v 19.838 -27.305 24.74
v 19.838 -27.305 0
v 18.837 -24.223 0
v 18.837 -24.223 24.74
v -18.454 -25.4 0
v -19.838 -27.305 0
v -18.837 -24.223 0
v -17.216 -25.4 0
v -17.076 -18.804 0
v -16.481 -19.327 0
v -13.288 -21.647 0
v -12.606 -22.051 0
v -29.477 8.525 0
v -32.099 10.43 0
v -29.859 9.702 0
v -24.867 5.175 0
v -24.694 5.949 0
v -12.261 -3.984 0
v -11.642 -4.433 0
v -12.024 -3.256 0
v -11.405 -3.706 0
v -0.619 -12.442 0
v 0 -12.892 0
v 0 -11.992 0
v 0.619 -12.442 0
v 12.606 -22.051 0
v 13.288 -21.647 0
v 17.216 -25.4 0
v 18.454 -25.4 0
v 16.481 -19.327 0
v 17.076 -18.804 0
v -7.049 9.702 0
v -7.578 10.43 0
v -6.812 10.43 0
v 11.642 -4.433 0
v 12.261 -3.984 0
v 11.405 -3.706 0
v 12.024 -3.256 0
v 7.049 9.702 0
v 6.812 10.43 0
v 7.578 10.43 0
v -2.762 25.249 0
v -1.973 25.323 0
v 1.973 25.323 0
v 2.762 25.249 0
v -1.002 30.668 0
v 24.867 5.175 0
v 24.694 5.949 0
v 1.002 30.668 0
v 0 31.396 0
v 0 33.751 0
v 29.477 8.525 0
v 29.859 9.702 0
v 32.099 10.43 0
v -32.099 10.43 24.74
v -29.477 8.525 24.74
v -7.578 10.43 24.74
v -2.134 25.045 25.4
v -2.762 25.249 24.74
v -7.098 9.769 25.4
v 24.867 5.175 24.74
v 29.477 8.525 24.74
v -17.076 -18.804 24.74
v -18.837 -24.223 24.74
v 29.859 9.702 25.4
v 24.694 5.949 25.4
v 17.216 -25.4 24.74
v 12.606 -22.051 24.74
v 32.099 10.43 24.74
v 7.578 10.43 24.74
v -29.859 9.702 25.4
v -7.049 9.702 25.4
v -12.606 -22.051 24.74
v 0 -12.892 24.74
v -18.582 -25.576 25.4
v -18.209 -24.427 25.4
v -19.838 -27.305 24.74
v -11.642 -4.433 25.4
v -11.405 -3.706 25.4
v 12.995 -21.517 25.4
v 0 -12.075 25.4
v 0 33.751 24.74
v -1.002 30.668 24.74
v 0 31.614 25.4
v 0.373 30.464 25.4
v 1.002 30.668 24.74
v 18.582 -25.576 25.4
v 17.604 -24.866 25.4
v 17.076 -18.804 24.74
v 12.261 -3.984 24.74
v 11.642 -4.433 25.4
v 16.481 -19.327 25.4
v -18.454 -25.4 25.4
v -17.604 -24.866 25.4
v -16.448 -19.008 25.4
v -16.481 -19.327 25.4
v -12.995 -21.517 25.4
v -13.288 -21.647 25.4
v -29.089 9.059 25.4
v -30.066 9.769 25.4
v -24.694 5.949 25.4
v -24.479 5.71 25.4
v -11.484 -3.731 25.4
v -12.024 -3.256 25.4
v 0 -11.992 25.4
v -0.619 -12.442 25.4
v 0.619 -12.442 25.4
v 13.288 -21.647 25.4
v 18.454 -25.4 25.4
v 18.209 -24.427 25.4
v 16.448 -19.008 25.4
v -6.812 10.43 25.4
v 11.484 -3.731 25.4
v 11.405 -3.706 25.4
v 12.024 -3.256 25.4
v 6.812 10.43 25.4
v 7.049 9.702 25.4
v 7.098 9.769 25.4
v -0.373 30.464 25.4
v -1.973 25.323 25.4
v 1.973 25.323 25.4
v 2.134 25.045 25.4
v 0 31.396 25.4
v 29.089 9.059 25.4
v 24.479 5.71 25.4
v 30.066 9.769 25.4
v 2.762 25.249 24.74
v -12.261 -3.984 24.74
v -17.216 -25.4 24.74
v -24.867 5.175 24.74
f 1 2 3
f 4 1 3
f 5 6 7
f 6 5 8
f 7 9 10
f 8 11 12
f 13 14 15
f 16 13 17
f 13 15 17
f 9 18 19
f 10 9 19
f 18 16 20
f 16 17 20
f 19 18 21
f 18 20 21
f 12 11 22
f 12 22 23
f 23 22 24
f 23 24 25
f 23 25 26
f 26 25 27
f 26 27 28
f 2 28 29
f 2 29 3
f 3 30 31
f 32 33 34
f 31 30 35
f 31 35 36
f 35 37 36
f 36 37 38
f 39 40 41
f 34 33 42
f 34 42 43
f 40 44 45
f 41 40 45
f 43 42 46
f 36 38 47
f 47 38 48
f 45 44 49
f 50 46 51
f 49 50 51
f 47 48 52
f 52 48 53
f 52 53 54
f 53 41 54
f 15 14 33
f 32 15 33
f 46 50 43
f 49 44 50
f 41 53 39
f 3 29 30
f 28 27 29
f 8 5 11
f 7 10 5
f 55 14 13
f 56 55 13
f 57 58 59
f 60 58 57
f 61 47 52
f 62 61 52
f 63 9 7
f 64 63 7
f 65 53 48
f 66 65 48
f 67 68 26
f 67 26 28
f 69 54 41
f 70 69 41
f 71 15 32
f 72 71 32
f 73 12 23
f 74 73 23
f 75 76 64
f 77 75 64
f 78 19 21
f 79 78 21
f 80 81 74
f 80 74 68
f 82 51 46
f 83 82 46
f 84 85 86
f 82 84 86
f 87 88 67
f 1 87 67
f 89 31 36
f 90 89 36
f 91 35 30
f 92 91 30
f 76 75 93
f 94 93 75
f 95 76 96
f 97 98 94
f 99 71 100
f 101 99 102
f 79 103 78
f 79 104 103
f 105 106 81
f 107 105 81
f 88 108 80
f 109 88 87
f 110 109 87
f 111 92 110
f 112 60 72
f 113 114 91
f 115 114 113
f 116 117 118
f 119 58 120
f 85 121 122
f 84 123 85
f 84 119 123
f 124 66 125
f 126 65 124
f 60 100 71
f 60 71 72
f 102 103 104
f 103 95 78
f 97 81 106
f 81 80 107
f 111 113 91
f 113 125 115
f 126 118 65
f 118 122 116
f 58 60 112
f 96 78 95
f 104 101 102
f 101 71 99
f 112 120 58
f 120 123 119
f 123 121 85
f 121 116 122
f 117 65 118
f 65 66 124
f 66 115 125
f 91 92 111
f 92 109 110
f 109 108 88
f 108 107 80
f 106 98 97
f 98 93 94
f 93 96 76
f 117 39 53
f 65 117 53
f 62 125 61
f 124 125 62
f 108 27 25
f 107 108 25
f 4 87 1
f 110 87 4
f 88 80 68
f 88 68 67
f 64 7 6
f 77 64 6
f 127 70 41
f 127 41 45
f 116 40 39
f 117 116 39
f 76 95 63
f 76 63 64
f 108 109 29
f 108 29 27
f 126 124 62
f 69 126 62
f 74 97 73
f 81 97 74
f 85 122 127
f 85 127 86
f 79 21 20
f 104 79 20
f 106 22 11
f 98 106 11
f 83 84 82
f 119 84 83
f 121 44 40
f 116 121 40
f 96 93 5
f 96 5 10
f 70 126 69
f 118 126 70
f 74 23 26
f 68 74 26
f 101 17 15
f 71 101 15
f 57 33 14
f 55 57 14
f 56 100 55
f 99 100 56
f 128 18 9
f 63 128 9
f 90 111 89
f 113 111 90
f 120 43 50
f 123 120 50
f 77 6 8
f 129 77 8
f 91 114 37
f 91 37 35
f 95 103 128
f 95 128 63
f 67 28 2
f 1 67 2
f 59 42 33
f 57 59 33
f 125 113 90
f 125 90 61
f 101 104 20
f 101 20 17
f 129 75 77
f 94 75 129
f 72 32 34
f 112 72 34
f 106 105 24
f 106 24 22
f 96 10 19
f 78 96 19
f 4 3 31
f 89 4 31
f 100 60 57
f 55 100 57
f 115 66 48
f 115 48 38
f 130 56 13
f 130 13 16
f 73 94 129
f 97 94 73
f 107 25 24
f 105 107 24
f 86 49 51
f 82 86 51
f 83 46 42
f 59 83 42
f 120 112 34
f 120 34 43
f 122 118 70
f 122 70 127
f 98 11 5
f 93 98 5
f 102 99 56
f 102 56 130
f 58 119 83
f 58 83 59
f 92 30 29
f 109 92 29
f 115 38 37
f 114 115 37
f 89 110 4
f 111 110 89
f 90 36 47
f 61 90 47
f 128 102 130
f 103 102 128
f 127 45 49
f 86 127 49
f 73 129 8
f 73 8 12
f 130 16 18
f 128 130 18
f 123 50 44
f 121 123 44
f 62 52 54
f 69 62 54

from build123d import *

# Parameters (mm, degrees)
F1_DEPTH = 25.4
F2_SIZE  = 0.6604


with BuildPart() as f1:
    # F0 (on Top) → F1 (new body)
    with BuildSketch(Plane.XY):
        with BuildLine():
            Line((-12.2607089005, -3.9837458116), (-17.0759435824, -18.8035143197))
            ThreePointArc((-17.0759435824, -18.8035143197), (-16.7805039882, -19.0676345125), (-16.4809797049, -19.3271132859))
            Line((-16.4809797049, -19.3271132859), (-11.6417368792, -4.4334553087))
            Line((-11.6417368792, -4.4334553087), (-12.2607089005, -3.9837458116))
        make_face()
        with BuildLine():
            Line((-12.2607089005, -3.9837458116), (-12.0242826264, -3.2561005601))
            Line((-12.0242826264, -3.2561005601), (-24.6935848241, 5.9486862866))
            ThreePointArc((-24.6935848241, 5.9486862866), (-24.7833872632, 5.5627075929), (-24.8671569615, 5.1753748319))
            Line((-24.8671569615, 5.1753748319), (-12.2607089005, -3.9837458116))
        make_face()
        with BuildLine():
            Line((-12.606448061, -22.0507928947), (0, -12.8916722513))
            Line((0, -12.8916722513), (-0.6189720213, -12.4419627541))
            Line((-0.6189720213, -12.4419627541), (-13.2882742189, -21.6467496009))
            ThreePointArc((-13.2882742189, -21.6467496009), (-12.9489371469, -21.8514307716), (-12.606448061, -22.0507928947))
        make_face()
        with BuildLine():
            Line((-17.0759435824, -18.8035143197), (-18.8367259586, -24.2226452514))
            Line((-18.8367259586, -24.2226452514), (-18.4541802113, -25.4))
            Line((-18.4541802113, -25.4), (-16.4809797049, -19.3271132859))
            ThreePointArc((-16.4809797049, -19.3271132859), (-16.7805039882, -19.0676345125), (-17.0759435824, -18.8035143197))
        make_face()
        with BuildLine():
            Line((-18.4541802113, -25.4), (-17.2162361687, -25.4))
            Line((-17.2162361687, -25.4), (-12.606448061, -22.0507928947))
            ThreePointArc((-12.606448061, -22.0507928947), (-12.9489371469, -21.8514307716), (-13.2882742189, -21.6467496009))
            Line((-13.2882742189, -21.6467496009), (-18.4541802113, -25.4))
        make_face()
        Polygon((-18.8367259586, -24.2226452514), (-19.8382437272, -27.305), (-17.2162361687, -25.4), (-18.4541802113, -25.4), align=None)
        with BuildLine():
            ThreePointArc((-1.9732005064, 25.3232399144), (-2.3680385381, 25.2893731334), (-2.7623001448, 25.2493504453))
            Line((-2.7623001448, 25.2493504453), (-7.5775348267, 10.4295819372))
            Line((-7.5775348267, 10.4295819372), (-6.8124433322, 10.4295819372))
            Line((-6.8124433322, 10.4295819372), (-1.9732005064, 25.3232399144))
        make_face()
        with BuildLine():
            Line((6.8124433322, 10.4295819372), (7.5775348267, 10.4295819372))
            Line((7.5775348267, 10.4295819372), (2.7623001448, 25.2493504453))
            ThreePointArc((2.7623001448, 25.2493504453), (2.3680385381, 25.2893731334), (1.9732005064, 25.3232399144))
            Line((1.9732005064, 25.3232399144), (6.8124433322, 10.4295819372))
        make_face()
        with BuildLine():
            Line((12.2607089005, -3.9837458116), (24.8671569615, 5.1753748319))
            ThreePointArc((24.8671569615, 5.1753748319), (24.7833872632, 5.5627075929), (24.6935848241, 5.9486862866))
            Line((24.6935848241, 5.9486862866), (12.0242826264, -3.2561005601))
            Line((12.0242826264, -3.2561005601), (12.2607089005, -3.9837458116))
        make_face()
        with BuildLine():
            Line((17.0759435824, -18.8035143197), (12.2607089005, -3.9837458116))
            Line((12.2607089005, -3.9837458116), (11.6417368792, -4.4334553087))
            Line((11.6417368792, -4.4334553087), (16.4809797049, -19.3271132859))
            ThreePointArc((16.4809797049, -19.3271132859), (16.7805039882, -19.0676345125), (17.0759435824, -18.8035143197))
        make_face()
        Polygon((11.6417368792, -4.4334553087), (12.2607089005, -3.9837458116), (12.0242826264, -3.2561005601), (11.4053106051, -3.7058100573), align=None)
        with BuildLine():
            ThreePointArc((24.6935848241, 5.9486862866), (24.7833872632, 5.5627075929), (24.8671569615, 5.1753748319))
            Line((24.8671569615, 5.1753748319), (29.4769450692, 8.5245819372))
            Line((29.4769450692, 8.5245819372), (29.8594908165, 9.7019366858))
            Line((29.8594908165, 9.7019366858), (24.6935848241, 5.9486862866))
        make_face()
        Polygon((29.8594908165, 9.7019366858), (29.4769450692, 8.5245819372), (32.0989526277, 10.4295819372), (28.8579730479, 10.4295819372), align=None)
        with BuildLine():
            ThreePointArc((23.1599615849, 10.4295819372), (23.31985896, 10.0669845578), (23.4740798445, 9.7019366858))
            Line((23.4740798445, 9.7019366858), (29.8594908165, 9.7019366858))
            Line((29.8594908165, 9.7019366858), (28.8579730479, 10.4295819372))
            Line((28.8579730479, 10.4295819372), (23.1599615849, 10.4295819372))
        make_face()
        with BuildLine():
            Line((7.8139611007, 9.7019366858), (23.4740798445, 9.7019366858))
            ThreePointArc((23.4740798445, 9.7019366858), (23.31985896, 10.0669845578), (23.1599615849, 10.4295819372))
            Line((23.1599615849, 10.4295819372), (7.5775348267, 10.4295819372))
            Line((7.5775348267, 10.4295819372), (7.8139611007, 9.7019366858))
        make_face()
        Polygon((7.0488696062, 9.7019366858), (7.8139611007, 9.7019366858), (7.5775348267, 10.4295819372), (6.8124433322, 10.4295819372), align=None)
        with BuildLine():
            Line((-23.4740798445, 9.7019366858), (-7.8139611007, 9.7019366858))
            Line((-7.8139611007, 9.7019366858), (-7.5775348267, 10.4295819372))
            Line((-7.5775348267, 10.4295819372), (-23.1599615849, 10.4295819372))
            ThreePointArc((-23.1599615849, 10.4295819372), (-23.31985896, 10.0669845578), (-23.4740798445, 9.7019366858))
        make_face()
        with BuildLine():
            Line((-23.1599615849, 10.4295819372), (-28.8579730479, 10.4295819372))
            Line((-28.8579730479, 10.4295819372), (-29.8594908165, 9.7019366858))
            Line((-29.8594908165, 9.7019366858), (-23.4740798445, 9.7019366858))
            ThreePointArc((-23.4740798445, 9.7019366858), (-23.31985896, 10.0669845578), (-23.1599615849, 10.4295819372))
        make_face()
        Polygon((-28.8579730479, 10.4295819372), (-32.0989526277, 10.4295819372), (-29.4769450692, 8.5245819372), (-29.8594908165, 9.7019366858), align=None)
        with BuildLine():
            Line((-29.8594908165, 9.7019366858), (-29.4769450692, 8.5245819372))
            Line((-29.4769450692, 8.5245819372), (-24.8671569615, 5.1753748319))
            ThreePointArc((-24.8671569615, 5.1753748319), (-24.7833872632, 5.5627075929), (-24.6935848241, 5.9486862866))
            Line((-24.6935848241, 5.9486862866), (-29.8594908165, 9.7019366858))
        make_face()
        Polygon((-7.8139611007, 9.7019366858), (-7.0488696062, 9.7019366858), (-6.8124433322, 10.4295819372), (-7.5775348267, 10.4295819372), align=None)
        Polygon((0, -12.8916722513), (0.6189720213, -12.4419627541), (0, -11.992253257), (-0.6189720213, -12.4419627541), align=None)
        with BuildLine():
            Line((13.2882742189, -21.6467496009), (0.6189720213, -12.4419627541))
            Line((0.6189720213, -12.4419627541), (0, -12.8916722513))
            Line((0, -12.8916722513), (12.606448061, -22.0507928947))
            ThreePointArc((12.606448061, -22.0507928947), (12.9489371469, -21.8514307716), (13.2882742189, -21.6467496009))
        make_face()
        with BuildLine():
            Line((17.2162361687, -25.4), (18.4541802113, -25.4))
            Line((18.4541802113, -25.4), (13.2882742189, -21.6467496009))
            ThreePointArc((13.2882742189, -21.6467496009), (12.9489371469, -21.8514307716), (12.606448061, -22.0507928947))
            Line((12.606448061, -22.0507928947), (17.2162361687, -25.4))
        make_face()
        with BuildLine():
            Line((18.8367259586, -24.2226452514), (17.0759435824, -18.8035143197))
            ThreePointArc((17.0759435824, -18.8035143197), (16.7805039882, -19.0676345125), (16.4809797049, -19.3271132859))
            Line((16.4809797049, -19.3271132859), (18.4541802113, -25.4))
            Line((18.4541802113, -25.4), (18.8367259586, -24.2226452514))
        make_face()
        Polygon((19.8382437272, -27.305), (18.8367259586, -24.2226452514), (18.4541802113, -25.4), (17.2162361687, -25.4), align=None)
        with BuildLine():
            Line((0, 31.3961266285), (-1.0015177686, 30.6684813771))
            Line((-1.0015177686, 30.6684813771), (-2.7623001448, 25.2493504453))
            ThreePointArc((-2.7623001448, 25.2493504453), (-2.3680385381, 25.2893731334), (-1.9732005064, 25.3232399144))
            Line((-1.9732005064, 25.3232399144), (0, 31.3961266285))
        make_face()
        with BuildLine():
            Line((2.7623001448, 25.2493504453), (1.0015177686, 30.6684813771))
            Line((1.0015177686, 30.6684813771), (0, 31.3961266285))
            Line((0, 31.3961266285), (1.9732005064, 25.3232399144))
            ThreePointArc((1.9732005064, 25.3232399144), (2.3680385381, 25.2893731334), (2.7623001448, 25.2493504453))
        make_face()
        Polygon((1.0015177686, 30.6684813771), (0, 33.7508361256), (-1.0015177686, 30.6684813771), (0, 31.3961266285), align=None)
        Polygon((-11.6417368792, -4.4334553087), (-11.4053106051, -3.7058100573), (-12.0242826264, -3.2561005601), (-12.2607089005, -3.9837458116), align=None)
    extrude(amount=F1_DEPTH)

    # F2
    f2_edges = [f1.edges().sort_by_distance(p)[0] for p in [
        (-19.838244, 10.429582, 25.4),
        (-22.179831, 3.222918, 25.4),
        (-16.049476, -15.644373, 25.4),
        (-9.919122, -20.098336, 25.4),
        (9.919122, -20.098336, 25.4),
        (16.049476, -15.644373, 25.4),
        (22.179831, 3.222918, 25.4),
        (19.838244, 10.429582, 25.4),
        (3.788767, 22.090209, 25.4),
        (-3.788767, 22.090209, 25.4),
    ]]
    chamfer(f2_edges, length=F2_SIZE)


solid = f1.part
